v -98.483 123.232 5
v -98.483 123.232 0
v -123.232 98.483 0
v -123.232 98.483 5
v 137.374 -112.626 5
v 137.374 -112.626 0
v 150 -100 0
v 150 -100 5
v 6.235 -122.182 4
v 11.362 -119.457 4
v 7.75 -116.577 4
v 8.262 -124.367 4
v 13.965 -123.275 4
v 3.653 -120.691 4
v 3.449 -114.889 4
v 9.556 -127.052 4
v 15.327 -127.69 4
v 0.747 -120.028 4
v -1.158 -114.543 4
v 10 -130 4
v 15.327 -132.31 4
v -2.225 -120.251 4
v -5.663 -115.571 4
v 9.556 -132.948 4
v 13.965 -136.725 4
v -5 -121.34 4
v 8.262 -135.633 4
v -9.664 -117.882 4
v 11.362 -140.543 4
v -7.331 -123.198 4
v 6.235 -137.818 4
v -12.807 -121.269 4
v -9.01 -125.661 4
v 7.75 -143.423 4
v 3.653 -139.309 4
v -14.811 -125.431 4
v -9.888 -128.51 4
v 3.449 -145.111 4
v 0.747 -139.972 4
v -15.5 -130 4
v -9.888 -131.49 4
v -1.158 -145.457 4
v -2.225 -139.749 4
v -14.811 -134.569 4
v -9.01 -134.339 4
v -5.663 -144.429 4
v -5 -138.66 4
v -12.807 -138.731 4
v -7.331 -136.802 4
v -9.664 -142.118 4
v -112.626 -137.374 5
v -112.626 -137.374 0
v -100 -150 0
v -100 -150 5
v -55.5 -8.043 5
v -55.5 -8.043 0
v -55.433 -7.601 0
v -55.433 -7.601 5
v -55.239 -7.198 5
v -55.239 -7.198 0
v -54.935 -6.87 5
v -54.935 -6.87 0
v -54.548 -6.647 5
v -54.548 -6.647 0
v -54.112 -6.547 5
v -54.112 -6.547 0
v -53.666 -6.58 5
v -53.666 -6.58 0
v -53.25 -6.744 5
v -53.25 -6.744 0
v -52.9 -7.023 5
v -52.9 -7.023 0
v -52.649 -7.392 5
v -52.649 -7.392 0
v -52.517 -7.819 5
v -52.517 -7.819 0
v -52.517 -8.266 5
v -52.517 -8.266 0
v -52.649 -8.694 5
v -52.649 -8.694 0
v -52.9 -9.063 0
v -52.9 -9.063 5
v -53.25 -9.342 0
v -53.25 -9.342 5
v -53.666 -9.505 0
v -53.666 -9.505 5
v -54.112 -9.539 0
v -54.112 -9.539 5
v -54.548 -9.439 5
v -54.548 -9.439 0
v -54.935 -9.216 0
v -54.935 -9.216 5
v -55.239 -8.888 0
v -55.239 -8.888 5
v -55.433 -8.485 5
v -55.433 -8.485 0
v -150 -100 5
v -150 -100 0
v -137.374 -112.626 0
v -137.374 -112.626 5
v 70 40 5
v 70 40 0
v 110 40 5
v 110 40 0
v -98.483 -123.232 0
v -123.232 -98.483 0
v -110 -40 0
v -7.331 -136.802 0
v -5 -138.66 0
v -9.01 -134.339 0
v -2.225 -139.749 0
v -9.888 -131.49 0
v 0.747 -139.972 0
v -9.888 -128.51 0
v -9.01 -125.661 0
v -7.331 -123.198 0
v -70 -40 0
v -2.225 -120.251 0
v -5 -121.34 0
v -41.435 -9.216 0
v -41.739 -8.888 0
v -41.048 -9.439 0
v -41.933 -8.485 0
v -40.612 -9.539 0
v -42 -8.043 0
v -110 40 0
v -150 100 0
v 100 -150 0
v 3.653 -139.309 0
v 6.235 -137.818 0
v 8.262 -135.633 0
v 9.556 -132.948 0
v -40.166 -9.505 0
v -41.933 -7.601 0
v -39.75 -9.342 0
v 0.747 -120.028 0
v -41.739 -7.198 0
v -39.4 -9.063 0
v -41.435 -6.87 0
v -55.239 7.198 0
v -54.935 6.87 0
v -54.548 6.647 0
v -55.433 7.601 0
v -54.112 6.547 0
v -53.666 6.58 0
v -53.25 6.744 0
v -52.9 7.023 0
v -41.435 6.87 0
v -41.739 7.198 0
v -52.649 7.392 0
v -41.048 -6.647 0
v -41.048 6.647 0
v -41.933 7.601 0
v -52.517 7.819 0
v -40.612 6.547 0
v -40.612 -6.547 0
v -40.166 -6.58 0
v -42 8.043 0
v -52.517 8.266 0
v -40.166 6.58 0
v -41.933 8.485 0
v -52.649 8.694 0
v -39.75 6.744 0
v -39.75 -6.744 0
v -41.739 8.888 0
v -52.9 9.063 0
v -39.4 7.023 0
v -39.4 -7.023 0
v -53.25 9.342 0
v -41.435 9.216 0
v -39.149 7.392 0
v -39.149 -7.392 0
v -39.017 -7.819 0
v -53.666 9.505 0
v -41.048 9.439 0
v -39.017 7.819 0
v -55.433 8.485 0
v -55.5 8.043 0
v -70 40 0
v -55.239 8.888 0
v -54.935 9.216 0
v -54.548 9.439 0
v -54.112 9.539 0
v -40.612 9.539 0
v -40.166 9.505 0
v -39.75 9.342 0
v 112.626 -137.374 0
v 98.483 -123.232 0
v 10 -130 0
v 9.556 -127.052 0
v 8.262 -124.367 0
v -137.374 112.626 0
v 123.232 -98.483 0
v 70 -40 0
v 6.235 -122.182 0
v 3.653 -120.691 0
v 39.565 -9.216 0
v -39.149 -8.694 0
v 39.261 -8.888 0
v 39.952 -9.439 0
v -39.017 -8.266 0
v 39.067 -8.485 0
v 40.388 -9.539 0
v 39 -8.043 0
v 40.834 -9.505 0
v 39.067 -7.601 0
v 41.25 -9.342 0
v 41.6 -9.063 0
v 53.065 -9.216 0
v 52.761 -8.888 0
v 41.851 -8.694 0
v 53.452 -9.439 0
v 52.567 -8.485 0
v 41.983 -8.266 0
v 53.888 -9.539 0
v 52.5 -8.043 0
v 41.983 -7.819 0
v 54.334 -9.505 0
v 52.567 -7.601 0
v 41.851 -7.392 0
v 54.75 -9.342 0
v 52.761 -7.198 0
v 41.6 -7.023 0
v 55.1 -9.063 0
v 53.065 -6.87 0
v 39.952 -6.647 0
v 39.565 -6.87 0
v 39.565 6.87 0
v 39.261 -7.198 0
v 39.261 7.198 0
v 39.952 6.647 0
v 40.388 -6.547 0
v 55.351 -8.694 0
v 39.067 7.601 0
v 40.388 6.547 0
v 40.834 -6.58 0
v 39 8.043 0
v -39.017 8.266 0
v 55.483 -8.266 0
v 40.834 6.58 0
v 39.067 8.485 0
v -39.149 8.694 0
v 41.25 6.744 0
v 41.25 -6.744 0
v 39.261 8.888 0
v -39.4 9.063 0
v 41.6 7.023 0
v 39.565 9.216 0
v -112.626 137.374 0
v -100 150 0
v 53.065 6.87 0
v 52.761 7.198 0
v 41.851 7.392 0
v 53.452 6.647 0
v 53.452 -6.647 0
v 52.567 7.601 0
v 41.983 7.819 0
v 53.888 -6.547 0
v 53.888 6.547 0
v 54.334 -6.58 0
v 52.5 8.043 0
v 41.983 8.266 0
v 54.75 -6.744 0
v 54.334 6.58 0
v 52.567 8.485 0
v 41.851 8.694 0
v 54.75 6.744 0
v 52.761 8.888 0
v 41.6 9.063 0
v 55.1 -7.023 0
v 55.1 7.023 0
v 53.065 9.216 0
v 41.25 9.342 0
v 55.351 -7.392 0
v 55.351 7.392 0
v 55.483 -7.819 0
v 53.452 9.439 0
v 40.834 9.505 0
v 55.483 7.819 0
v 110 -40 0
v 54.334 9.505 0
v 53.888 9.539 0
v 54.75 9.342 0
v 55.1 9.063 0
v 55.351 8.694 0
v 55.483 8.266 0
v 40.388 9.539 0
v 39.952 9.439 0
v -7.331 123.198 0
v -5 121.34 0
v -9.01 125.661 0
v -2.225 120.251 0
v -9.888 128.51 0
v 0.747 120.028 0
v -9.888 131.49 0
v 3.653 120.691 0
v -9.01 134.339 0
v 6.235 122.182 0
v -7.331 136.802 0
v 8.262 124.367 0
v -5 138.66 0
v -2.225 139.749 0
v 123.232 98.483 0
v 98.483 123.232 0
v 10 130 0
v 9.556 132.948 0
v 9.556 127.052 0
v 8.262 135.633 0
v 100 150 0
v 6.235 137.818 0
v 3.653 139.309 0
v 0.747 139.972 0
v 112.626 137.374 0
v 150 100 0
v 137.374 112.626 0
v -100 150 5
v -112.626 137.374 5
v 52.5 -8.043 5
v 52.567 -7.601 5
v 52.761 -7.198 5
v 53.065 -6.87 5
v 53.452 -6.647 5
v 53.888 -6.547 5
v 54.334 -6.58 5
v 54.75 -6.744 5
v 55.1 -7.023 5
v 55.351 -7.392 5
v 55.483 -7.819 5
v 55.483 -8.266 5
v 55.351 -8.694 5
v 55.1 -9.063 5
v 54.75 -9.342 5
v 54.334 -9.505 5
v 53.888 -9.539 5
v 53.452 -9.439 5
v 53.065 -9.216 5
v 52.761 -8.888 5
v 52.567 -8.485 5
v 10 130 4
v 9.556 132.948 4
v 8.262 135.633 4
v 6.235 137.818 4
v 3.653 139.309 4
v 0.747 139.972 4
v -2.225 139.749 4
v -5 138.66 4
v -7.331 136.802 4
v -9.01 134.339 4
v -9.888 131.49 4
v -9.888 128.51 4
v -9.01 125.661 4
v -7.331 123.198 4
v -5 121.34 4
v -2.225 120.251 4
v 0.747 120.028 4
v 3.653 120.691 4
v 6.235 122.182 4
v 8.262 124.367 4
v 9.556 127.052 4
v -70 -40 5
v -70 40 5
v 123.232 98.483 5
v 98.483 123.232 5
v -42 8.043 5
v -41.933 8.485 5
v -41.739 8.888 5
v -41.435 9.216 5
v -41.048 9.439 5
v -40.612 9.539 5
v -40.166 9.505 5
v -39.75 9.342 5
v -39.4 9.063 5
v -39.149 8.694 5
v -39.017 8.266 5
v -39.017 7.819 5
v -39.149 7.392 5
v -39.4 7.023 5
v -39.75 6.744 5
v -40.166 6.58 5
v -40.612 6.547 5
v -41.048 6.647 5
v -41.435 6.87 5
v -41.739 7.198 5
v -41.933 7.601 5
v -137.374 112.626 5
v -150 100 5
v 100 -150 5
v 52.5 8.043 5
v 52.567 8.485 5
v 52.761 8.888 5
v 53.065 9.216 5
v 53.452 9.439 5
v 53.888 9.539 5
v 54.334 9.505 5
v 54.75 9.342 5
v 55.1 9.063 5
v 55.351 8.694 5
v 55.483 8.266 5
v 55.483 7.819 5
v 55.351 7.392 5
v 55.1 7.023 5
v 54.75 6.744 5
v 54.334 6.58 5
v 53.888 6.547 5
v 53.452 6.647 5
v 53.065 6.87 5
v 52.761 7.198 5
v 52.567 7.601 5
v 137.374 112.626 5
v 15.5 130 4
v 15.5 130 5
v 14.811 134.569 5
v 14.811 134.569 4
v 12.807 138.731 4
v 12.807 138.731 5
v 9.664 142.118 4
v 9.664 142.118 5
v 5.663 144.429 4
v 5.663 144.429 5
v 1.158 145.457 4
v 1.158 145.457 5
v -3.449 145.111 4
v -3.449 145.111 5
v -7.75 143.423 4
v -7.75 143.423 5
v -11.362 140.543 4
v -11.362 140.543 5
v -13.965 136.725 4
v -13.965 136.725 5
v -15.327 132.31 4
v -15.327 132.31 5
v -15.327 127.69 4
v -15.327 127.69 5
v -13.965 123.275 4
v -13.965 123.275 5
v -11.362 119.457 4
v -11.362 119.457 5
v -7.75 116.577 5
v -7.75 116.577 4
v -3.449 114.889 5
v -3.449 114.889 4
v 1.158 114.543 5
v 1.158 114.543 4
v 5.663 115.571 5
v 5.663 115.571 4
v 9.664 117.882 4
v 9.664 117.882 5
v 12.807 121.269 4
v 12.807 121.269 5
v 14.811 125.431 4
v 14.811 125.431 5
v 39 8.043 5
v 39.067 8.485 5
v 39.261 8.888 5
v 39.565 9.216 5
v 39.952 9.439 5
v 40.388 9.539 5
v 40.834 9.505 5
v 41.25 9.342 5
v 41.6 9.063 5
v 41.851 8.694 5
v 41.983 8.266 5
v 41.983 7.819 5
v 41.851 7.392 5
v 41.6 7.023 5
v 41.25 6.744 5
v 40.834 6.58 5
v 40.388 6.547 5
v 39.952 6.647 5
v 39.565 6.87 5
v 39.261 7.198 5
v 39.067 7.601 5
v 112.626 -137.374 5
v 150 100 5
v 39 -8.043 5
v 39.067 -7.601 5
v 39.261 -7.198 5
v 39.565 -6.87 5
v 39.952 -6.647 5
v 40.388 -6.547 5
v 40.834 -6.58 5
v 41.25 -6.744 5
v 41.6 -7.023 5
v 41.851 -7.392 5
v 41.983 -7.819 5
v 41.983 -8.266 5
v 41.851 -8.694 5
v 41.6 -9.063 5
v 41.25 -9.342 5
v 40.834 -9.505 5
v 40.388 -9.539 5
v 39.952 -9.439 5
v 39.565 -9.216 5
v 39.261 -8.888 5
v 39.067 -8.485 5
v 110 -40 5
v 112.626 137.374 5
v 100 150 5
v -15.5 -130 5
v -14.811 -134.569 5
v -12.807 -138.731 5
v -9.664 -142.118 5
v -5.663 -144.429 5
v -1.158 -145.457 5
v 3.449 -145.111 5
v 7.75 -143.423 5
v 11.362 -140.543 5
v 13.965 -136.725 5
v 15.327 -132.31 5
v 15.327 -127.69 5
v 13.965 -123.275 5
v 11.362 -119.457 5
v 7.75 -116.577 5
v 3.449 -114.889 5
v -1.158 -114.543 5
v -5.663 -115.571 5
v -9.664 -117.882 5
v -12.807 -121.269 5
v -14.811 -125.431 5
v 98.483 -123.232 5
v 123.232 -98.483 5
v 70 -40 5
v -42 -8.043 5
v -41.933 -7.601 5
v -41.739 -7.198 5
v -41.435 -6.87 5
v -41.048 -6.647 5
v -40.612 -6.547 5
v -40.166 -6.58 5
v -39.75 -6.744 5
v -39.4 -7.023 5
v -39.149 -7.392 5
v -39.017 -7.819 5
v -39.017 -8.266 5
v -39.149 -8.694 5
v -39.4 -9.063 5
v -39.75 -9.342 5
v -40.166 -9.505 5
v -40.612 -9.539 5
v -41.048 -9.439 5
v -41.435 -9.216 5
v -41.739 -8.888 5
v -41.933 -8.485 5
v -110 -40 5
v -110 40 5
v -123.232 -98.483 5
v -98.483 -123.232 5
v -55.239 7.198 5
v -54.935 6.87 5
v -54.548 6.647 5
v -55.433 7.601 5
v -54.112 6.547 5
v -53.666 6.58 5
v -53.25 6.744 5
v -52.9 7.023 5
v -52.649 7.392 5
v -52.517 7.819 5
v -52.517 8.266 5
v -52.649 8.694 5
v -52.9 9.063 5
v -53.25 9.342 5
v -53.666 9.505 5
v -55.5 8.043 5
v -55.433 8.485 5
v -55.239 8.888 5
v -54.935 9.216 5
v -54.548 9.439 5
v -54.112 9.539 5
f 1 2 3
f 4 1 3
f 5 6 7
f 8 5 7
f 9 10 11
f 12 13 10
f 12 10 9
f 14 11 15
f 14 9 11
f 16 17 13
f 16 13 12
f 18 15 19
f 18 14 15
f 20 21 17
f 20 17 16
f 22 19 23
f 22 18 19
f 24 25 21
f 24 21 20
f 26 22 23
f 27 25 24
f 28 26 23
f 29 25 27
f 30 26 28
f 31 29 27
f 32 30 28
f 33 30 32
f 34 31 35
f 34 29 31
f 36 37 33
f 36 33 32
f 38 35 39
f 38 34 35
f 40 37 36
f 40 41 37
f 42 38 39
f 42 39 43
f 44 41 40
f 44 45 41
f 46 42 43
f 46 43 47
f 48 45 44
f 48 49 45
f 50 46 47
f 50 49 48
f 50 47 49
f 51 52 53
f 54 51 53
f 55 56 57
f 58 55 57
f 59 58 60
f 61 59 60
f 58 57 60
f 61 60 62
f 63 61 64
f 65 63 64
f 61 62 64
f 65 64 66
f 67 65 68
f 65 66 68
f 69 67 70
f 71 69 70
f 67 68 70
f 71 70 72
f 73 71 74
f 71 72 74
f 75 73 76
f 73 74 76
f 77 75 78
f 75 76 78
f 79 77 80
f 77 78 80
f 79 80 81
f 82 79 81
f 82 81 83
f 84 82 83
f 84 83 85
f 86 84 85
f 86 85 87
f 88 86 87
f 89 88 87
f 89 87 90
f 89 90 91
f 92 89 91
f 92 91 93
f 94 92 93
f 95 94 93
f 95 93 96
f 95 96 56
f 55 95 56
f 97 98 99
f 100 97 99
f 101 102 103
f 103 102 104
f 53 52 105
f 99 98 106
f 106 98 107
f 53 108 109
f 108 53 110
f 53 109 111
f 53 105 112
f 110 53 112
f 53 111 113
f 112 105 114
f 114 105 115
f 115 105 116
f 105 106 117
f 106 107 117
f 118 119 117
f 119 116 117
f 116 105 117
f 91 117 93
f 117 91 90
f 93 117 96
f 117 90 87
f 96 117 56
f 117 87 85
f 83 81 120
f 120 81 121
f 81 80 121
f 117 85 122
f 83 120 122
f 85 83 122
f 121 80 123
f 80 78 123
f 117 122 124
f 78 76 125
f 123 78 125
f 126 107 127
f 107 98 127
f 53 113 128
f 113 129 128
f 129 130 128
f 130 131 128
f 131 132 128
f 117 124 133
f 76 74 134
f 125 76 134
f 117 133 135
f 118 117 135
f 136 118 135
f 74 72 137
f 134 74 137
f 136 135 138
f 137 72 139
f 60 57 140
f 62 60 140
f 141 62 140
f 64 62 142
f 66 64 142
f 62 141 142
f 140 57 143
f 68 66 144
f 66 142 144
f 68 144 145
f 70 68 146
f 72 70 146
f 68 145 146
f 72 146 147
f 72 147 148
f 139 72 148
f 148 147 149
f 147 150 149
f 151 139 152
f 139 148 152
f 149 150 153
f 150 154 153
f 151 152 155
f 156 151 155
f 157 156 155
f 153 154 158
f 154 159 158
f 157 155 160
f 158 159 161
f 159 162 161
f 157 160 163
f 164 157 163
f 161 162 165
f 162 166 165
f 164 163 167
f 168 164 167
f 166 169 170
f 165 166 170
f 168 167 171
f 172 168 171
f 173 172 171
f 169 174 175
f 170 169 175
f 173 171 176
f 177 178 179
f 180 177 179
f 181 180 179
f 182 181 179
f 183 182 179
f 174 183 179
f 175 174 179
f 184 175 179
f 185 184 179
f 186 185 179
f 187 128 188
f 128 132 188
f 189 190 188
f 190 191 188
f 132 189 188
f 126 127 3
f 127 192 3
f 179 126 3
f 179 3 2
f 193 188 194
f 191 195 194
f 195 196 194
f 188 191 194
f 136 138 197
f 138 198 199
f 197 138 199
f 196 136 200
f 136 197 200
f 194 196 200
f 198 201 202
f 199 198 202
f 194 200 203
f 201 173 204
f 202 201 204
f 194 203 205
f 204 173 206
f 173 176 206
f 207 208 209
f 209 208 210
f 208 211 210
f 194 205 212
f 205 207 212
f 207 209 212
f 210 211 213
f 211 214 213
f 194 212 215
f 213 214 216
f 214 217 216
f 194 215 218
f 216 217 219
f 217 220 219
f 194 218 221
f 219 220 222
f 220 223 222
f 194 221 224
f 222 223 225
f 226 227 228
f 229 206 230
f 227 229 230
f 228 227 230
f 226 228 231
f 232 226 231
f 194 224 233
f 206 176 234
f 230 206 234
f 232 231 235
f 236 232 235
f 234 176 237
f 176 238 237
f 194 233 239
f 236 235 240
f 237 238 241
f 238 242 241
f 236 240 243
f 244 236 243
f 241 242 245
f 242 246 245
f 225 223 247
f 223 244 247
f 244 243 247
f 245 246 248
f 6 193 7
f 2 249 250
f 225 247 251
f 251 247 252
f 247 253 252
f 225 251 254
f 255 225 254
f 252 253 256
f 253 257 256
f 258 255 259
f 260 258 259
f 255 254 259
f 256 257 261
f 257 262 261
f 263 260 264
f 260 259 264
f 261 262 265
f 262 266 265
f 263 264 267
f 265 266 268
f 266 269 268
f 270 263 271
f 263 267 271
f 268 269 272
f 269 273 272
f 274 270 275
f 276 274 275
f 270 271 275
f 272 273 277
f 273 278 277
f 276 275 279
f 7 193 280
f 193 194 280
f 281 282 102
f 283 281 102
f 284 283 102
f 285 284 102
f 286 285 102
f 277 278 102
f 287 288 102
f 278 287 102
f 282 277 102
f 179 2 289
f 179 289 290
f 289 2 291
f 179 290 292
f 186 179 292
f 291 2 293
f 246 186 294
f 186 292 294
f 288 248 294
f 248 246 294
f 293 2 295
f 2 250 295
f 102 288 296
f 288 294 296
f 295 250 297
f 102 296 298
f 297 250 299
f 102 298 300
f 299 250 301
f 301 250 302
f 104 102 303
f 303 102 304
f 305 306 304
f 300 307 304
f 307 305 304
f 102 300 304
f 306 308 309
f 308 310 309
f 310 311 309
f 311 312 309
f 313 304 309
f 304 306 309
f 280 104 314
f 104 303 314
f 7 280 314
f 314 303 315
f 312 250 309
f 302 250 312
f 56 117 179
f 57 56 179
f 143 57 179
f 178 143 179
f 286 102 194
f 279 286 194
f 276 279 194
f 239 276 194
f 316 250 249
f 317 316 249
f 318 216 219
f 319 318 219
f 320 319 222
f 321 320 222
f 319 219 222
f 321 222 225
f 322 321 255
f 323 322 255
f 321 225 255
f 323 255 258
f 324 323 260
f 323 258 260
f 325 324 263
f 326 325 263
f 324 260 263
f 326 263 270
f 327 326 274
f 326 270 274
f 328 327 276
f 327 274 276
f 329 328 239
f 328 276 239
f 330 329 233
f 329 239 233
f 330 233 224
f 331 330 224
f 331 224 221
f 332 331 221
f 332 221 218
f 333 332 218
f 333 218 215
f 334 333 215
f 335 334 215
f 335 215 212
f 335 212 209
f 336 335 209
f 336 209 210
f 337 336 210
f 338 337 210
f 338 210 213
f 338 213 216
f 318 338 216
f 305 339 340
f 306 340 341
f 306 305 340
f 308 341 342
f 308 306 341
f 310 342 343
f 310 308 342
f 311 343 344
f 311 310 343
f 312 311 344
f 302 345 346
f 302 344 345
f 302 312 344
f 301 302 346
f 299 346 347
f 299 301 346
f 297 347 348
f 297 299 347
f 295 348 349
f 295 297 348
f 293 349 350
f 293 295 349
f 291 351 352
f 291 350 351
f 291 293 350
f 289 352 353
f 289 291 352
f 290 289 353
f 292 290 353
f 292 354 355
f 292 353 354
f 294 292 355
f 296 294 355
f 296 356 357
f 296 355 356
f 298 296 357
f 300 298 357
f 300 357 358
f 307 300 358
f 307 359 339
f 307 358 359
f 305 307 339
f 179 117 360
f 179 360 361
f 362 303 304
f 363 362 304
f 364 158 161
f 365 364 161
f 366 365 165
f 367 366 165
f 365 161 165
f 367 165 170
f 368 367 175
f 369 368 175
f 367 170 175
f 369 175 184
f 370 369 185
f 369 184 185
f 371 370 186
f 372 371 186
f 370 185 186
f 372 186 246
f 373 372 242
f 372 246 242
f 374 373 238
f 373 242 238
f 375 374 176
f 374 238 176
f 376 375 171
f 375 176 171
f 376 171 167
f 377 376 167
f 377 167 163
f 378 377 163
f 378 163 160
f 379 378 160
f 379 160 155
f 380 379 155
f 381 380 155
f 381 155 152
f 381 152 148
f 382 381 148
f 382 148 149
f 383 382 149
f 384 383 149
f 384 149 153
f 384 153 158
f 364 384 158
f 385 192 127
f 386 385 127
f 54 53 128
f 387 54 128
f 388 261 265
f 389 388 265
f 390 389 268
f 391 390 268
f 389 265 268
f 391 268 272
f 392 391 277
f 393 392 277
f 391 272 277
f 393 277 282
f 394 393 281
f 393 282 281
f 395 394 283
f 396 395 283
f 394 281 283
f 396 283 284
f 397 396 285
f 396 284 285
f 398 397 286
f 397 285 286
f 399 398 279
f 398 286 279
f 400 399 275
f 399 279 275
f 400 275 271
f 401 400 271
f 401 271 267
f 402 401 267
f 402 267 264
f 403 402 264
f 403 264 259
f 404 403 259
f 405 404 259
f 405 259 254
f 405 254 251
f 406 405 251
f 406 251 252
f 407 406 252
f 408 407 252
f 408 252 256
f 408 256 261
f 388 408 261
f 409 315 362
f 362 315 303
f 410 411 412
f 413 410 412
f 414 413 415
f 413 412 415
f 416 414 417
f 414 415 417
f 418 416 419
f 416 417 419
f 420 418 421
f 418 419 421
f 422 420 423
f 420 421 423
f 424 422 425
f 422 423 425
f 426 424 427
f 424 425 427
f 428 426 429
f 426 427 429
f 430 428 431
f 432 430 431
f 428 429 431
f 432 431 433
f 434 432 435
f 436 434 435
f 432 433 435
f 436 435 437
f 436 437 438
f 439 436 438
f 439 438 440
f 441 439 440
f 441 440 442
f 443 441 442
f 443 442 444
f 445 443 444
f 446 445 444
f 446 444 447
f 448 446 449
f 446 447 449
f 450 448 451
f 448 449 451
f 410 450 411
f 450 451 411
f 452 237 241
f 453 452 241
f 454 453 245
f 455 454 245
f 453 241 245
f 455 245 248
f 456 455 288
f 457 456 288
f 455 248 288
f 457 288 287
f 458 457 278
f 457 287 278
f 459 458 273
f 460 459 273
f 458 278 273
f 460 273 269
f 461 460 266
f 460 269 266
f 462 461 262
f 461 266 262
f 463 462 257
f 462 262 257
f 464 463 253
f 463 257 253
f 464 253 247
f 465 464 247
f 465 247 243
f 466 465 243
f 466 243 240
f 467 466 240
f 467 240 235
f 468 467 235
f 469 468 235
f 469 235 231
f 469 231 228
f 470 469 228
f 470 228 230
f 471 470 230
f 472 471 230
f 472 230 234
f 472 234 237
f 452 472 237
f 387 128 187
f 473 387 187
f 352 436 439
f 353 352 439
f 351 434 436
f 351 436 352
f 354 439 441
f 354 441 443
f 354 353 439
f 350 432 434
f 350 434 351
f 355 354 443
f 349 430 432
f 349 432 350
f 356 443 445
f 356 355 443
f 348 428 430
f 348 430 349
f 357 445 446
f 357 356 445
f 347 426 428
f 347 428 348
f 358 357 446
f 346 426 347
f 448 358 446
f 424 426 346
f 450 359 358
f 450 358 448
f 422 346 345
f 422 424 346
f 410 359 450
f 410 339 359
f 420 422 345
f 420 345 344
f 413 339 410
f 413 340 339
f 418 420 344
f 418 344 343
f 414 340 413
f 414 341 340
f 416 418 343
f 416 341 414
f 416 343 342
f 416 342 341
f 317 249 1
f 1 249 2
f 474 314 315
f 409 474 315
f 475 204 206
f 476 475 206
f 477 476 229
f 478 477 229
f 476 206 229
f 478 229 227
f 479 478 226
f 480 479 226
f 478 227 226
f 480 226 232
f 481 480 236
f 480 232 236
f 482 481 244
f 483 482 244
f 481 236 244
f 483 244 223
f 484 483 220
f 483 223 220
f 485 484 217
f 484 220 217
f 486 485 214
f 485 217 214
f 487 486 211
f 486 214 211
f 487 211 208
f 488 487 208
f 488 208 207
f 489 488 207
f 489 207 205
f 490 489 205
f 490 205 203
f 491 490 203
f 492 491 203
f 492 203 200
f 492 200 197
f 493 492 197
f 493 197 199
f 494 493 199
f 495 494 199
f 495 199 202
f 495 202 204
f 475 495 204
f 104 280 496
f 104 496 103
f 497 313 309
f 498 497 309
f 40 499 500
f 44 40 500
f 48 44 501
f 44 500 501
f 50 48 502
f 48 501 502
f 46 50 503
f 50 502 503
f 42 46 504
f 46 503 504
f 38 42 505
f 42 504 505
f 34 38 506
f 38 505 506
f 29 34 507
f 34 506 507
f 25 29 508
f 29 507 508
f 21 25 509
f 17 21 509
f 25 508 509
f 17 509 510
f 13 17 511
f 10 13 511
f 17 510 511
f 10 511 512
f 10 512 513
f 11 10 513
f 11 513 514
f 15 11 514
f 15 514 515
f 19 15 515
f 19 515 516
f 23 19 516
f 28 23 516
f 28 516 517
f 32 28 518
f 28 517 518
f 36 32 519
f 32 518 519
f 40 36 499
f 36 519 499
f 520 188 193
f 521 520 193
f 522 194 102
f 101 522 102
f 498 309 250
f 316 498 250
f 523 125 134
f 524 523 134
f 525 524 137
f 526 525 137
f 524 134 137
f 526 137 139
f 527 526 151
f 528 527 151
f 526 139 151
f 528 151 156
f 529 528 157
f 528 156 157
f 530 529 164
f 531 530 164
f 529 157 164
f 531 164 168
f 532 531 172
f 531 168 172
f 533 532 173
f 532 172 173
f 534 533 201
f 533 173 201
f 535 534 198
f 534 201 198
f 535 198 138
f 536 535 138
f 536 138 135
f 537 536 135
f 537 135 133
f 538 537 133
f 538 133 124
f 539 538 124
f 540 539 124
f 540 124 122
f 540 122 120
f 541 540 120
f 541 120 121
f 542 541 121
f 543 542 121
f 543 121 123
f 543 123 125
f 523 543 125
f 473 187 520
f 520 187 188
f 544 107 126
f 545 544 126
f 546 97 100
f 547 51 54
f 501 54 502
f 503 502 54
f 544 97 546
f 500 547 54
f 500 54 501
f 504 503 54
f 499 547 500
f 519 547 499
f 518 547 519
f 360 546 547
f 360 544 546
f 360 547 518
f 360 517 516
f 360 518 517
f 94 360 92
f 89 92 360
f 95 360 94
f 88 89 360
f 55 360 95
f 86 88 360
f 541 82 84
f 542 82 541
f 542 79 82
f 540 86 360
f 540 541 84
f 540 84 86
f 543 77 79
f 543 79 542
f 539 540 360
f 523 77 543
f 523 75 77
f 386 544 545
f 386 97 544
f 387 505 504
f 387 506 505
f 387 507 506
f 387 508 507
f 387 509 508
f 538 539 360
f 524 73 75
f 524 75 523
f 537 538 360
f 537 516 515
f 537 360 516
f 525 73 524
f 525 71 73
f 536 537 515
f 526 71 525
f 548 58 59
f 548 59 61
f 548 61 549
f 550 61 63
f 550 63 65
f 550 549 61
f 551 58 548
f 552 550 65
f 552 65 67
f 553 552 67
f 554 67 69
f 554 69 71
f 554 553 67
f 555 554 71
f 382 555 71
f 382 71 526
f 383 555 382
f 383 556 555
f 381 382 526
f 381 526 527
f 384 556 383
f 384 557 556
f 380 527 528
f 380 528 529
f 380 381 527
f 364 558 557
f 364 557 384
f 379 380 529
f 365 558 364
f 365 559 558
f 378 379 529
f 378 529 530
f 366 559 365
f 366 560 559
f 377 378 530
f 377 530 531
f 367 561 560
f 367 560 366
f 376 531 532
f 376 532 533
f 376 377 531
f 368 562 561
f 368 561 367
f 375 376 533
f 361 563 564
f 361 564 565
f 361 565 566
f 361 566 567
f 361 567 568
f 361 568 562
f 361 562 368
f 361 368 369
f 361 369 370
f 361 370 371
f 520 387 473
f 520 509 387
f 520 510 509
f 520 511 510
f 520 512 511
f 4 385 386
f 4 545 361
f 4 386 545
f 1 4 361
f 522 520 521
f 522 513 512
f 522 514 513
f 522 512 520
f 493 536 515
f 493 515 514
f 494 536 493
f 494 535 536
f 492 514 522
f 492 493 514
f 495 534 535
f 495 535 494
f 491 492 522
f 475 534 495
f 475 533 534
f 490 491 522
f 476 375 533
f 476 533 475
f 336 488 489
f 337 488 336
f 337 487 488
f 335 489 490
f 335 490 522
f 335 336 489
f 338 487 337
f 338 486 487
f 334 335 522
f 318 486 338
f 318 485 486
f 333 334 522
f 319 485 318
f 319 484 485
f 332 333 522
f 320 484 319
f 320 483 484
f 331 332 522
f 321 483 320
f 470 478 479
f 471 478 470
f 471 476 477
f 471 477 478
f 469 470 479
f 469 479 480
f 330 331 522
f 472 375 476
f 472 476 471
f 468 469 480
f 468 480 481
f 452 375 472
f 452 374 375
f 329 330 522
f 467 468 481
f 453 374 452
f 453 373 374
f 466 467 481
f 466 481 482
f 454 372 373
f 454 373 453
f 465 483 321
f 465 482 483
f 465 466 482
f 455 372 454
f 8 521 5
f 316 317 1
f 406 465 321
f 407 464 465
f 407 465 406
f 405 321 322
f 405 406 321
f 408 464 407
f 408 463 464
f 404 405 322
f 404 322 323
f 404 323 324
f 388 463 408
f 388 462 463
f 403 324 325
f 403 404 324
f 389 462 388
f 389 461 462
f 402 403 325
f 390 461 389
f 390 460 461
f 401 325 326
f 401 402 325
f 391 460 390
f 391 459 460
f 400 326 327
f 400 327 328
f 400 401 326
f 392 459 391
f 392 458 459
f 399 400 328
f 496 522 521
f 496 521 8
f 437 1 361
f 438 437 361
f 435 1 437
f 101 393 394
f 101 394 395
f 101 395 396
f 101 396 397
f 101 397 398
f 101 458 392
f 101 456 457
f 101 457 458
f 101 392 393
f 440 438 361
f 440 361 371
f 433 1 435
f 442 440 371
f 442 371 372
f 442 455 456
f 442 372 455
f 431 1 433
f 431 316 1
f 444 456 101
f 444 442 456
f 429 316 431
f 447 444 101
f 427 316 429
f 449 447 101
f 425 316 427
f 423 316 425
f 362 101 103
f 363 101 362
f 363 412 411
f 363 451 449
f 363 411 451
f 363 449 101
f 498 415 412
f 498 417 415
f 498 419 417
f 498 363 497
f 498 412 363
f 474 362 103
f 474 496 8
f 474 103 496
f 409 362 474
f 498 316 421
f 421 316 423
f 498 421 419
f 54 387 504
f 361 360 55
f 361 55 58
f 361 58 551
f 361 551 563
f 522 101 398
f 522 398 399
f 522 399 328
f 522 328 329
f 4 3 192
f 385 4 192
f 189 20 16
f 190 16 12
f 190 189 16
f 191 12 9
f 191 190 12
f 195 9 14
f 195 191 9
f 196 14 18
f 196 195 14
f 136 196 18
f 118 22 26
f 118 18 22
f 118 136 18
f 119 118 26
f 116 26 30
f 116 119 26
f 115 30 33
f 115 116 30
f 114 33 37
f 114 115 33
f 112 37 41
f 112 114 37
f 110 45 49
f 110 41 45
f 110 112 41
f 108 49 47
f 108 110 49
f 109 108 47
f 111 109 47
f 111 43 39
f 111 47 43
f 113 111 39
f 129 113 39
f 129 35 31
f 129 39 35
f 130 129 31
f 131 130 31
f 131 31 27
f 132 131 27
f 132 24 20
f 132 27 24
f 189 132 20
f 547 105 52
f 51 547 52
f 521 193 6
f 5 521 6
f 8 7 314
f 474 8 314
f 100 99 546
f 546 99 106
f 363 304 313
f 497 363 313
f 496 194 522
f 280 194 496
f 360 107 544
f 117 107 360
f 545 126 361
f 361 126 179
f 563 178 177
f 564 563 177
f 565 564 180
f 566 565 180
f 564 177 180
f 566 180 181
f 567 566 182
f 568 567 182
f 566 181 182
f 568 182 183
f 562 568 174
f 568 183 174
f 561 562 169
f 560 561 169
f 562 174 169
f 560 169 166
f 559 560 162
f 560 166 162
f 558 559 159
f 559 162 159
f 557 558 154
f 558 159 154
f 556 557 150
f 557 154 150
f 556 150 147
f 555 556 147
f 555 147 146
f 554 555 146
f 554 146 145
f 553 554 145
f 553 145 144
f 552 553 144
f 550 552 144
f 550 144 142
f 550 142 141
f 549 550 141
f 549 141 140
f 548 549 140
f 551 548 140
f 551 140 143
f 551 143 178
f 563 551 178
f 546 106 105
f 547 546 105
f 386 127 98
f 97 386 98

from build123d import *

# Parameters (mm, degrees)
ESQUISSE1_W             = 40
ESQUISSE1_H             = 80
ESQUISSE1_R             = 10
BOSS_EXTRU_1_DEPTH      = 5
ESQUISSE2_R             = 15.5
ENL_V_MAT_EXTRU_1_DEPTH = 1
ESQUISSE3_R             = 1.5
ENL_V_MAT_EXTRU_2_DEPTH = 213.190951739


with BuildPart() as part:
    # Esquisse1 → Boss.-Extru.1 (new body)
    with BuildSketch(Plane.XY):
        Polygon((112.625631329, 137.374368671), (100, 150), (-100, 150), (-112.625631329, 137.374368671), (-98.483495706, 123.232233047), (-123.232233047, 98.483495706), (-137.374368671, 112.625631329), (-150, 100), (-150, -100), (-137.374368671, -112.625631329), (-123.232233047, -98.483495706), (-98.483495706, -123.232233047), (-112.625631329, -137.374368671), (-100, -150), (100, -150), (112.625631329, -137.374368671), (98.483495706, -123.232233047), (123.232233047, -98.483495706), (137.374368671, -112.625631329), (150, -100), (150, 100), (137.374368671, 112.625631329), (123.232233047, 98.483495706), (98.483495706, 123.232233047), align=None)
        with Locations((-90, 0)):
            Rectangle(ESQUISSE1_W, ESQUISSE1_H, mode=Mode.SUBTRACT)
        with Locations((0, -130)):
            Circle(ESQUISSE1_R, mode=Mode.SUBTRACT)
        with Locations((90, 0)):
            Rectangle(ESQUISSE1_W, ESQUISSE1_H, mode=Mode.SUBTRACT)
        with Locations((0, 130)):
            Circle(ESQUISSE1_R, mode=Mode.SUBTRACT)
    extrude(amount=BOSS_EXTRU_1_DEPTH)

    # Esquisse2 → Enlèv. mat.-Extru.1 (cut)
    with BuildSketch(Plane.XY.offset(5)):
        with Locations((0, 130)):
            Circle(ESQUISSE2_R)
        with Locations(Location((0, -130, 0), (0, 0, 180))):
            Circle(ESQUISSE2_R)
    extrude(amount=-ENL_V_MAT_EXTRU_1_DEPTH, mode=Mode.SUBTRACT)

    # Esquisse3 → Enlèv. mat.-Extru.2 (cut, through all)
    with BuildSketch(Plane(origin=(0, 0, 0), x_dir=(-1, 0, 0), z_dir=(0, 0, -1))):
        with Locations((-40.5, 8.042853971)):
            Circle(ESQUISSE3_R)
        with Locations((-40.5, -8.042853971)):
            Circle(ESQUISSE3_R)
        with Locations((-54, 8.042853971)):
            Circle(ESQUISSE3_R)
        with Locations((-54, -8.042853971)):
            Circle(ESQUISSE3_R)
        with Locations((40.5, -8.042853971)):
            Circle(ESQUISSE3_R)
        with Locations((54, -8.042853971)):
            Circle(ESQUISSE3_R)
        with Locations((54, 8.042853971)):
            Circle(ESQUISSE3_R)
        with Locations((40.5, 8.042853971)):
            Circle(ESQUISSE3_R)
    extrude(amount=-ENL_V_MAT_EXTRU_2_DEPTH, mode=Mode.SUBTRACT)


solid = part.part
